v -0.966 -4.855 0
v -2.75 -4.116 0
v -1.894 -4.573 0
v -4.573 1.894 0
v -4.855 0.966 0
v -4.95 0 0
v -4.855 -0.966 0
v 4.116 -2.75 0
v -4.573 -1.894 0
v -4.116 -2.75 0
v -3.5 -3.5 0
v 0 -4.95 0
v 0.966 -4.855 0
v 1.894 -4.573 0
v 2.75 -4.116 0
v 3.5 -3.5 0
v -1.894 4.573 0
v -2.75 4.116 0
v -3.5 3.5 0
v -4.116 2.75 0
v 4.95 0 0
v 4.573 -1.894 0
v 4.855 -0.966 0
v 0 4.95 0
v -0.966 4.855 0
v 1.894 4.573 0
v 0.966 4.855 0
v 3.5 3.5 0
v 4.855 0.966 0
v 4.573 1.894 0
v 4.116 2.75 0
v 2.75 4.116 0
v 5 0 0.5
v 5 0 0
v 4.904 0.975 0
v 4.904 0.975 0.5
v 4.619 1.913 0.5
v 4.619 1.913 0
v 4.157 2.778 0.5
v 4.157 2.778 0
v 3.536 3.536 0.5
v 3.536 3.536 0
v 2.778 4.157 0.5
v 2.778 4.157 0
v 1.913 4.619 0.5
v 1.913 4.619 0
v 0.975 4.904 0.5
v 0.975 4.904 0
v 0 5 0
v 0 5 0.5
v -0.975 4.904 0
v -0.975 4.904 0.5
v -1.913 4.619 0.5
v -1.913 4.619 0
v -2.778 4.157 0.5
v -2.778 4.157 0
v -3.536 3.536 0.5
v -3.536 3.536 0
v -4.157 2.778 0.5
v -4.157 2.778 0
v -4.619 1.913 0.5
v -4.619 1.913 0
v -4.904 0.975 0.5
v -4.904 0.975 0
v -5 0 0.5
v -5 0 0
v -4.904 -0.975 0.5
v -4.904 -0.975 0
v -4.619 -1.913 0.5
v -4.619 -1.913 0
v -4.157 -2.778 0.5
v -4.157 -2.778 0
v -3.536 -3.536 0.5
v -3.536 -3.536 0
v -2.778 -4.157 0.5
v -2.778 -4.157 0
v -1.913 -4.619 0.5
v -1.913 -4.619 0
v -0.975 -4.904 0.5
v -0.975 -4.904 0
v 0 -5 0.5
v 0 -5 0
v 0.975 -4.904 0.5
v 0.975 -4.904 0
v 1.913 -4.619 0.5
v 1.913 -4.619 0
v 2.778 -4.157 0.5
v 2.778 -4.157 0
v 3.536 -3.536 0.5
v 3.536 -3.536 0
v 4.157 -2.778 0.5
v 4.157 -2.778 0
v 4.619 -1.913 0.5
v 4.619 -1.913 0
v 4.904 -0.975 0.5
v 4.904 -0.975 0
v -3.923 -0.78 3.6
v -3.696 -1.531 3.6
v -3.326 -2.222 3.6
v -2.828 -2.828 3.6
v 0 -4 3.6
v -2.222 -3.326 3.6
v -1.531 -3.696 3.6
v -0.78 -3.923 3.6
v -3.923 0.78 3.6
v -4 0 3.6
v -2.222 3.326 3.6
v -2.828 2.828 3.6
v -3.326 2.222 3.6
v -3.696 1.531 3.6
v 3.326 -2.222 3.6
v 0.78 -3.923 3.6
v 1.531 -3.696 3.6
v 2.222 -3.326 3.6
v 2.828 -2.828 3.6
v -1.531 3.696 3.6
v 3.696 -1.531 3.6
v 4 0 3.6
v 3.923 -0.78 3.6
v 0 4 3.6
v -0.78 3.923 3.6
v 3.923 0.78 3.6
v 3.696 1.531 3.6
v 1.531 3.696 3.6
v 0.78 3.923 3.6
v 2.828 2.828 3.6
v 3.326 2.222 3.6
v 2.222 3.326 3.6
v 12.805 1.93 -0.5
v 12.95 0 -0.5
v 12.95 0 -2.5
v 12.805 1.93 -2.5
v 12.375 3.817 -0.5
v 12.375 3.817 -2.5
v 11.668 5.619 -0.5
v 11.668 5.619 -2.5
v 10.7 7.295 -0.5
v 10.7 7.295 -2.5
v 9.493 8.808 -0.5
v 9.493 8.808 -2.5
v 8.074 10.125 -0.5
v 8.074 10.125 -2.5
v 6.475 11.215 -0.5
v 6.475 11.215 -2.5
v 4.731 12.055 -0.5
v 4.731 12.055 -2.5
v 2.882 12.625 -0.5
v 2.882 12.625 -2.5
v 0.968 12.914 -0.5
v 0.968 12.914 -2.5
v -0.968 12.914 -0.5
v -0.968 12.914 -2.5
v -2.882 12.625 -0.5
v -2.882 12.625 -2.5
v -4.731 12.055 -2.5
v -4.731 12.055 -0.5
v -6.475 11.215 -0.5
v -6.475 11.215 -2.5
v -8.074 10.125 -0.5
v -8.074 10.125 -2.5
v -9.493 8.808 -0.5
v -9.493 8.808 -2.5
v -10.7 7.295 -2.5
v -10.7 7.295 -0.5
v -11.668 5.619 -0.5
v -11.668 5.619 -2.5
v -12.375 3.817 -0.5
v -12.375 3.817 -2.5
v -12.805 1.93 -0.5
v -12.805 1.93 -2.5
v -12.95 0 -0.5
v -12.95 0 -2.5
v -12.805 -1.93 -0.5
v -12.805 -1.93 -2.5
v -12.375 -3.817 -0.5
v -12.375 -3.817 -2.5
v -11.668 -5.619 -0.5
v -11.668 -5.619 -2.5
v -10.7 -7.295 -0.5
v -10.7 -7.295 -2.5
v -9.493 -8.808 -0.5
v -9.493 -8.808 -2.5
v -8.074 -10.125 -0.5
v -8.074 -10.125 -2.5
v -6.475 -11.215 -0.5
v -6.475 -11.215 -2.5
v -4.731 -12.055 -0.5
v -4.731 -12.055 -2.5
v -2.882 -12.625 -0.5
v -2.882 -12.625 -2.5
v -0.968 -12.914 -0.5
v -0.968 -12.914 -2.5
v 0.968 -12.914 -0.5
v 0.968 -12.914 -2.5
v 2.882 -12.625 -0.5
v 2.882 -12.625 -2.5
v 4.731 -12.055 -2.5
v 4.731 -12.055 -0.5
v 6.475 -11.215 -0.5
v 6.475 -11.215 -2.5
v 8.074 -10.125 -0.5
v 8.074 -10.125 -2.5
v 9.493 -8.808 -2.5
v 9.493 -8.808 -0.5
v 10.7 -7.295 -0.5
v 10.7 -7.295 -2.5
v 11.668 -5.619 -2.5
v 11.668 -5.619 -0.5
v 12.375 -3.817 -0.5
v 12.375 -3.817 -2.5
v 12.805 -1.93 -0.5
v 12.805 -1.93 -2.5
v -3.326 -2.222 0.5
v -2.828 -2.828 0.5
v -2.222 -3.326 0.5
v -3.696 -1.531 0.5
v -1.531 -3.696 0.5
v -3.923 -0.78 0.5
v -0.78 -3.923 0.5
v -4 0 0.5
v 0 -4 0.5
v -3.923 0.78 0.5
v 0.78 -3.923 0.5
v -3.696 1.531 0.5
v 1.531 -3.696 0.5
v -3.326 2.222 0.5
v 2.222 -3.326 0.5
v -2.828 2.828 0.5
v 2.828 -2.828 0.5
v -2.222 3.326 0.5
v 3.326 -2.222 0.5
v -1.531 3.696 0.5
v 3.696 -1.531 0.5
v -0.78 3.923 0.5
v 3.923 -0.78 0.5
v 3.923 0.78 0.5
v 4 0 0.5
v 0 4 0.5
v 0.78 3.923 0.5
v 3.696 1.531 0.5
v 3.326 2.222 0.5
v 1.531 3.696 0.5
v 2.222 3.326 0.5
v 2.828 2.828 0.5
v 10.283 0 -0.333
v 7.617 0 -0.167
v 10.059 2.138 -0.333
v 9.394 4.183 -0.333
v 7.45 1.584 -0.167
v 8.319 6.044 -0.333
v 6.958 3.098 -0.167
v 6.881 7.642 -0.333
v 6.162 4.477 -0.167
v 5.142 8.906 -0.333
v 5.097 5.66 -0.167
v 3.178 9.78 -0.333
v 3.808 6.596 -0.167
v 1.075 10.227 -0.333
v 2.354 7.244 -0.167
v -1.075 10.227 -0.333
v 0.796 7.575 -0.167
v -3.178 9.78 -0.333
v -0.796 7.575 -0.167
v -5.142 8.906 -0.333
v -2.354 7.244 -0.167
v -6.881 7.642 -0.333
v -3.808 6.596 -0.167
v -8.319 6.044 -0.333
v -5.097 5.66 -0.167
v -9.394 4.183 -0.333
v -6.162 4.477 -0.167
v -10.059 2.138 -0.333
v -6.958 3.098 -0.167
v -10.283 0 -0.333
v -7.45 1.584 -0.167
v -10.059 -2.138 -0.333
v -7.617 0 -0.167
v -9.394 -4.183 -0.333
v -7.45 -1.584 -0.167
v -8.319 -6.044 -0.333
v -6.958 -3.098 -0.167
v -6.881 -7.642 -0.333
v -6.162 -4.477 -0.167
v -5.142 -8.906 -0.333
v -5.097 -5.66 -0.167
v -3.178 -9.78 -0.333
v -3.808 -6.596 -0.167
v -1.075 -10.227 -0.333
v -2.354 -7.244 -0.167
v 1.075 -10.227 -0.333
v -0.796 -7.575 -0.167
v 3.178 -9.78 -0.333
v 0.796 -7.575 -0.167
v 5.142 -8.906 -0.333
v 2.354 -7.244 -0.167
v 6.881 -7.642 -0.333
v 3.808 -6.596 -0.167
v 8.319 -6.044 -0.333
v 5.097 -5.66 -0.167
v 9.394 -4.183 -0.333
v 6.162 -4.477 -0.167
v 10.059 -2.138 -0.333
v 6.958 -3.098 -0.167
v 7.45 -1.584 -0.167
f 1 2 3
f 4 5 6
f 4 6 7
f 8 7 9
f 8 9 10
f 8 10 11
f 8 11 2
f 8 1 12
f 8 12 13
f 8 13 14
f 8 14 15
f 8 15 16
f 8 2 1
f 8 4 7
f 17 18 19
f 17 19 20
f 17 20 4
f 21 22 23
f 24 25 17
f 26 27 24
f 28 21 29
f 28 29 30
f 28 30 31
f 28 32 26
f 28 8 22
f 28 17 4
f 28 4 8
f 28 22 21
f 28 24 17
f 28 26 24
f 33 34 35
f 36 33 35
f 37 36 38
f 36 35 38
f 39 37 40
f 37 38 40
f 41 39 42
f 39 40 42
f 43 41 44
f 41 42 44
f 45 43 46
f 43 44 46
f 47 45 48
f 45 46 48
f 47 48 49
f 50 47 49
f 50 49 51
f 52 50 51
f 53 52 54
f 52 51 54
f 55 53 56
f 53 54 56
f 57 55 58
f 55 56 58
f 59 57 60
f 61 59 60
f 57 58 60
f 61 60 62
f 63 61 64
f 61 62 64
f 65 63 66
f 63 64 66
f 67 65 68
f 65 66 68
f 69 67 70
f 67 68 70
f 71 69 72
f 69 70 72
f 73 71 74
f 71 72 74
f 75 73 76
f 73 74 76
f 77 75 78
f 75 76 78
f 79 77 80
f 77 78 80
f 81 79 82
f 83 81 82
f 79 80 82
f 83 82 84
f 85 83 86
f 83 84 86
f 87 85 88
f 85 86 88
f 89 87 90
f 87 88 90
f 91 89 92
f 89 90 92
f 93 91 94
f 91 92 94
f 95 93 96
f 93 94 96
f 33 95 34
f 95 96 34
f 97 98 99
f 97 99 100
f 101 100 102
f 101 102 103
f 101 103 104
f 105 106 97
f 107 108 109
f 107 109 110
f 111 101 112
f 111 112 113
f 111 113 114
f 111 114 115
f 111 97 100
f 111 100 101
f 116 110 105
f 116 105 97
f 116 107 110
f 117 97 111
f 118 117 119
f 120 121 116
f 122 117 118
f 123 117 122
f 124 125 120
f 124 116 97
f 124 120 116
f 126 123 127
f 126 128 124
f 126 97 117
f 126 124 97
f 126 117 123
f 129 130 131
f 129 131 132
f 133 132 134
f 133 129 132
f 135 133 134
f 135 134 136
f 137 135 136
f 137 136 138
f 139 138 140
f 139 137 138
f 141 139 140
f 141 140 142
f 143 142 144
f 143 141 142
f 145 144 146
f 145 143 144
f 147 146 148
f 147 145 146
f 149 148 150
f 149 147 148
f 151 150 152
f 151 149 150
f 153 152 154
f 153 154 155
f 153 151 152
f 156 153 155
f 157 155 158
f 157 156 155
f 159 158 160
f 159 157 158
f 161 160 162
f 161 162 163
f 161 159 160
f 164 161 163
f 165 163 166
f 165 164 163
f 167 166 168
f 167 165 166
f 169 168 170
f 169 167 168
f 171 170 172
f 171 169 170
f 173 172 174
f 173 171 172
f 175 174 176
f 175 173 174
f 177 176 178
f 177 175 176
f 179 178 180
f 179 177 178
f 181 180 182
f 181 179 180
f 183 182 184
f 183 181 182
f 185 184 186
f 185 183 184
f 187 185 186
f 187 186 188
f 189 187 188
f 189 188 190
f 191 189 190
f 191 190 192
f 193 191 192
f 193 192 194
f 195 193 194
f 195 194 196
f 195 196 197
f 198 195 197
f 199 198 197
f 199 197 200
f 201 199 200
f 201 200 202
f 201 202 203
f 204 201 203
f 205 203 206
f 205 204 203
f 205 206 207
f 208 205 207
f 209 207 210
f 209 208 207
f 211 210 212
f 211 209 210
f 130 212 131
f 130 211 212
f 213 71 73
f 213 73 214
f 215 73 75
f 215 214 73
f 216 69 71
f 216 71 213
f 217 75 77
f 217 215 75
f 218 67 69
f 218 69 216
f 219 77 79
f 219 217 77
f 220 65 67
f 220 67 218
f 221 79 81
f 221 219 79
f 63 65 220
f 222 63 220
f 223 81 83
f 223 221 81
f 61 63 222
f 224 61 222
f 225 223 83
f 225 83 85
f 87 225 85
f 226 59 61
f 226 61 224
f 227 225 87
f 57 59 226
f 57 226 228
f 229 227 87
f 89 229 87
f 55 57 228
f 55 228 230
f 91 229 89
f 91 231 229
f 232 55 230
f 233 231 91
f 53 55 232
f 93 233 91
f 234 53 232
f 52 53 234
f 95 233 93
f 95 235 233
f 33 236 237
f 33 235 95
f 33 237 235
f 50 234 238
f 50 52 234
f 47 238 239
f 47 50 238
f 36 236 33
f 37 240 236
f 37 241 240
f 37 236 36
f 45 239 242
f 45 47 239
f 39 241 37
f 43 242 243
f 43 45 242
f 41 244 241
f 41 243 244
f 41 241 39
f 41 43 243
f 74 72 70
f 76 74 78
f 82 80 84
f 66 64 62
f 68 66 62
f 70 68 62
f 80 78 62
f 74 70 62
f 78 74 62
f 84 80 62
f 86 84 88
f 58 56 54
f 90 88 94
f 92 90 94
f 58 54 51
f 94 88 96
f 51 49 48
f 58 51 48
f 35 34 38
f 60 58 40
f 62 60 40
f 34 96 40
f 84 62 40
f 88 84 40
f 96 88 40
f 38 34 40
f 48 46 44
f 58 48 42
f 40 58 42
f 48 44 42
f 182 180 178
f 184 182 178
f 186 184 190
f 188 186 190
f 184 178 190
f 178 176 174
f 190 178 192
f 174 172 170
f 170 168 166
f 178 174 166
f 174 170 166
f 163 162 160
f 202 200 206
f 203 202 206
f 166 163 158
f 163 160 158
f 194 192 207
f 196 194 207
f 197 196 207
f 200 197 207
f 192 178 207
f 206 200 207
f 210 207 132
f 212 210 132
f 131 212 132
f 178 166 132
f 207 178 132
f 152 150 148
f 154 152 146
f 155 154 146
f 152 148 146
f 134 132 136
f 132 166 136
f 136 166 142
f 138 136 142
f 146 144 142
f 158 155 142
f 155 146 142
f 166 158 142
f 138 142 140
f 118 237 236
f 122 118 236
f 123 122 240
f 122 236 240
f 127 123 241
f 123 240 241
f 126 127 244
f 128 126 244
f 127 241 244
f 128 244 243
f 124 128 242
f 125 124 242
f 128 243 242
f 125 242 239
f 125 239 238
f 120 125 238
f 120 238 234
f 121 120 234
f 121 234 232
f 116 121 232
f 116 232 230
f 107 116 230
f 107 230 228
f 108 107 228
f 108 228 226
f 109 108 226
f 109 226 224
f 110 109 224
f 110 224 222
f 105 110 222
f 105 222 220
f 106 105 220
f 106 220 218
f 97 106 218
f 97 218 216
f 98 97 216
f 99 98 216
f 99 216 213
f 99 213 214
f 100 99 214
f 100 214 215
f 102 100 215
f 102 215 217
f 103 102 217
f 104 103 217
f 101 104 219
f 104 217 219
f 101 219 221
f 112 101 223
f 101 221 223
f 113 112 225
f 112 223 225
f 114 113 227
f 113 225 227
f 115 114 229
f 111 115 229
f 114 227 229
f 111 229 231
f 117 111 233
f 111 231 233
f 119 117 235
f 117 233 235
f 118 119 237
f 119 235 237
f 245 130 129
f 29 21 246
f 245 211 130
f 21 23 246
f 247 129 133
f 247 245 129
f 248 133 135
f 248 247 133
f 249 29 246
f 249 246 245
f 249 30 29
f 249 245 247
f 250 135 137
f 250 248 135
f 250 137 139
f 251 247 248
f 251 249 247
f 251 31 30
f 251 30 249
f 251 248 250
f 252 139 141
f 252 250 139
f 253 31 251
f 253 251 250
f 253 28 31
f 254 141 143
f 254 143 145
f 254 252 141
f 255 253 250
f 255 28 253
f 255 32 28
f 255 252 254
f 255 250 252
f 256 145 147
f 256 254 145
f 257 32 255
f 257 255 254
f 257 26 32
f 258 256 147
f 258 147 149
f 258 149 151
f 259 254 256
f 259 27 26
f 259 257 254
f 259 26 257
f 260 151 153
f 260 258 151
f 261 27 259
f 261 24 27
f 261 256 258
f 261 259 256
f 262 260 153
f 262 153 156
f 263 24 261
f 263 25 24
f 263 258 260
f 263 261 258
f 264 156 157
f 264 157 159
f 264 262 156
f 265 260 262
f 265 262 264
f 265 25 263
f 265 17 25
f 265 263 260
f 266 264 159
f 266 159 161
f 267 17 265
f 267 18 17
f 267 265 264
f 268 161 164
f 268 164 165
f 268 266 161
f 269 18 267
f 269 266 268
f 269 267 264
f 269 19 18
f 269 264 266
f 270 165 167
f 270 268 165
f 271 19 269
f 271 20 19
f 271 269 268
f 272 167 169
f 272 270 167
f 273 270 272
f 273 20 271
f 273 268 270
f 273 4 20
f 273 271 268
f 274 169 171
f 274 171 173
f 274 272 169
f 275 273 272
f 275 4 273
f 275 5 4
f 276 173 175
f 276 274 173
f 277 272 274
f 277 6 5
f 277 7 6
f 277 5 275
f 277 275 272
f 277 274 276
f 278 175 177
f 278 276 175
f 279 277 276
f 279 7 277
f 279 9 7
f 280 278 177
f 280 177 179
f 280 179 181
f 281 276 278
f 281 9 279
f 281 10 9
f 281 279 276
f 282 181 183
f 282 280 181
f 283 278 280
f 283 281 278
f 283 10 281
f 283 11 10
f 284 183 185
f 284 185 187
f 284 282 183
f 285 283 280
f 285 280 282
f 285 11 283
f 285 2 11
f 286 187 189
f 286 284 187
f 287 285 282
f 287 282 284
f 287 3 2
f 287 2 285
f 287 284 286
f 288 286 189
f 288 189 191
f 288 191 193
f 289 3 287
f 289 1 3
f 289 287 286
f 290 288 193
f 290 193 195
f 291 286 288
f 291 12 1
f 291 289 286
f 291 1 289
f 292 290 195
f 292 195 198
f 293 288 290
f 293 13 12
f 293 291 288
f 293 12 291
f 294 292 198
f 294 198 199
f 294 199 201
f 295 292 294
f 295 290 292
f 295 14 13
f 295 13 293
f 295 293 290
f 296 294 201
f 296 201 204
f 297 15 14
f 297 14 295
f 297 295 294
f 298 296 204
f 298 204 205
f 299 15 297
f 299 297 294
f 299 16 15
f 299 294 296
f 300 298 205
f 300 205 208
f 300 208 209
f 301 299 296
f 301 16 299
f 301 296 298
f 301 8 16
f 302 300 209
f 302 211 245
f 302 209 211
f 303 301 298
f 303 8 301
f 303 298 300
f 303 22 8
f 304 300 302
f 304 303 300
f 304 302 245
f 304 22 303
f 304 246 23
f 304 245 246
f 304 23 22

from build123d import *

# Parameters (mm, degrees)
F0_R     = 4
F1_DEPTH = 3.6
F0_R_2   = 5
F2_DEPTH = 0.5
F0_R_3   = 12.95
F3_DEPTH = 2.5
F4_SIZE2 = 8
F4_SIZE  = 0.5


with BuildPart() as f1:
    # F0 (on Top) → F1 (new body)
    with BuildSketch(Plane.XY):
        Circle(F0_R)
    extrude(amount=F1_DEPTH)

    # F0 (on Top) → F2 (join)
    with BuildSketch(Plane.XY):
        Circle(F0_R_2)
        Circle(F0_R, mode=Mode.SUBTRACT)
    extrude(amount=F2_DEPTH)


with BuildPart() as f3:
    # F0 (on Top) → F3 (new body)
    with BuildSketch(Plane.XY):
        Circle(F0_R_3)
        Circle(F0_R_2, mode=Mode.SUBTRACT)
        Circle(F0_R_2)
        Circle(F0_R, mode=Mode.SUBTRACT)
        Circle(F0_R)
    extrude(amount=-F3_DEPTH)

    # F4
    f4_edges = [f3.edges().sort_by_distance(p)[0] for p in [
        (-12.95, 0, 0),
    ]]
    chamfer(f4_edges, length=F4_SIZE, length2=F4_SIZE2)


solid = Compound([f1.part, f3.part])
